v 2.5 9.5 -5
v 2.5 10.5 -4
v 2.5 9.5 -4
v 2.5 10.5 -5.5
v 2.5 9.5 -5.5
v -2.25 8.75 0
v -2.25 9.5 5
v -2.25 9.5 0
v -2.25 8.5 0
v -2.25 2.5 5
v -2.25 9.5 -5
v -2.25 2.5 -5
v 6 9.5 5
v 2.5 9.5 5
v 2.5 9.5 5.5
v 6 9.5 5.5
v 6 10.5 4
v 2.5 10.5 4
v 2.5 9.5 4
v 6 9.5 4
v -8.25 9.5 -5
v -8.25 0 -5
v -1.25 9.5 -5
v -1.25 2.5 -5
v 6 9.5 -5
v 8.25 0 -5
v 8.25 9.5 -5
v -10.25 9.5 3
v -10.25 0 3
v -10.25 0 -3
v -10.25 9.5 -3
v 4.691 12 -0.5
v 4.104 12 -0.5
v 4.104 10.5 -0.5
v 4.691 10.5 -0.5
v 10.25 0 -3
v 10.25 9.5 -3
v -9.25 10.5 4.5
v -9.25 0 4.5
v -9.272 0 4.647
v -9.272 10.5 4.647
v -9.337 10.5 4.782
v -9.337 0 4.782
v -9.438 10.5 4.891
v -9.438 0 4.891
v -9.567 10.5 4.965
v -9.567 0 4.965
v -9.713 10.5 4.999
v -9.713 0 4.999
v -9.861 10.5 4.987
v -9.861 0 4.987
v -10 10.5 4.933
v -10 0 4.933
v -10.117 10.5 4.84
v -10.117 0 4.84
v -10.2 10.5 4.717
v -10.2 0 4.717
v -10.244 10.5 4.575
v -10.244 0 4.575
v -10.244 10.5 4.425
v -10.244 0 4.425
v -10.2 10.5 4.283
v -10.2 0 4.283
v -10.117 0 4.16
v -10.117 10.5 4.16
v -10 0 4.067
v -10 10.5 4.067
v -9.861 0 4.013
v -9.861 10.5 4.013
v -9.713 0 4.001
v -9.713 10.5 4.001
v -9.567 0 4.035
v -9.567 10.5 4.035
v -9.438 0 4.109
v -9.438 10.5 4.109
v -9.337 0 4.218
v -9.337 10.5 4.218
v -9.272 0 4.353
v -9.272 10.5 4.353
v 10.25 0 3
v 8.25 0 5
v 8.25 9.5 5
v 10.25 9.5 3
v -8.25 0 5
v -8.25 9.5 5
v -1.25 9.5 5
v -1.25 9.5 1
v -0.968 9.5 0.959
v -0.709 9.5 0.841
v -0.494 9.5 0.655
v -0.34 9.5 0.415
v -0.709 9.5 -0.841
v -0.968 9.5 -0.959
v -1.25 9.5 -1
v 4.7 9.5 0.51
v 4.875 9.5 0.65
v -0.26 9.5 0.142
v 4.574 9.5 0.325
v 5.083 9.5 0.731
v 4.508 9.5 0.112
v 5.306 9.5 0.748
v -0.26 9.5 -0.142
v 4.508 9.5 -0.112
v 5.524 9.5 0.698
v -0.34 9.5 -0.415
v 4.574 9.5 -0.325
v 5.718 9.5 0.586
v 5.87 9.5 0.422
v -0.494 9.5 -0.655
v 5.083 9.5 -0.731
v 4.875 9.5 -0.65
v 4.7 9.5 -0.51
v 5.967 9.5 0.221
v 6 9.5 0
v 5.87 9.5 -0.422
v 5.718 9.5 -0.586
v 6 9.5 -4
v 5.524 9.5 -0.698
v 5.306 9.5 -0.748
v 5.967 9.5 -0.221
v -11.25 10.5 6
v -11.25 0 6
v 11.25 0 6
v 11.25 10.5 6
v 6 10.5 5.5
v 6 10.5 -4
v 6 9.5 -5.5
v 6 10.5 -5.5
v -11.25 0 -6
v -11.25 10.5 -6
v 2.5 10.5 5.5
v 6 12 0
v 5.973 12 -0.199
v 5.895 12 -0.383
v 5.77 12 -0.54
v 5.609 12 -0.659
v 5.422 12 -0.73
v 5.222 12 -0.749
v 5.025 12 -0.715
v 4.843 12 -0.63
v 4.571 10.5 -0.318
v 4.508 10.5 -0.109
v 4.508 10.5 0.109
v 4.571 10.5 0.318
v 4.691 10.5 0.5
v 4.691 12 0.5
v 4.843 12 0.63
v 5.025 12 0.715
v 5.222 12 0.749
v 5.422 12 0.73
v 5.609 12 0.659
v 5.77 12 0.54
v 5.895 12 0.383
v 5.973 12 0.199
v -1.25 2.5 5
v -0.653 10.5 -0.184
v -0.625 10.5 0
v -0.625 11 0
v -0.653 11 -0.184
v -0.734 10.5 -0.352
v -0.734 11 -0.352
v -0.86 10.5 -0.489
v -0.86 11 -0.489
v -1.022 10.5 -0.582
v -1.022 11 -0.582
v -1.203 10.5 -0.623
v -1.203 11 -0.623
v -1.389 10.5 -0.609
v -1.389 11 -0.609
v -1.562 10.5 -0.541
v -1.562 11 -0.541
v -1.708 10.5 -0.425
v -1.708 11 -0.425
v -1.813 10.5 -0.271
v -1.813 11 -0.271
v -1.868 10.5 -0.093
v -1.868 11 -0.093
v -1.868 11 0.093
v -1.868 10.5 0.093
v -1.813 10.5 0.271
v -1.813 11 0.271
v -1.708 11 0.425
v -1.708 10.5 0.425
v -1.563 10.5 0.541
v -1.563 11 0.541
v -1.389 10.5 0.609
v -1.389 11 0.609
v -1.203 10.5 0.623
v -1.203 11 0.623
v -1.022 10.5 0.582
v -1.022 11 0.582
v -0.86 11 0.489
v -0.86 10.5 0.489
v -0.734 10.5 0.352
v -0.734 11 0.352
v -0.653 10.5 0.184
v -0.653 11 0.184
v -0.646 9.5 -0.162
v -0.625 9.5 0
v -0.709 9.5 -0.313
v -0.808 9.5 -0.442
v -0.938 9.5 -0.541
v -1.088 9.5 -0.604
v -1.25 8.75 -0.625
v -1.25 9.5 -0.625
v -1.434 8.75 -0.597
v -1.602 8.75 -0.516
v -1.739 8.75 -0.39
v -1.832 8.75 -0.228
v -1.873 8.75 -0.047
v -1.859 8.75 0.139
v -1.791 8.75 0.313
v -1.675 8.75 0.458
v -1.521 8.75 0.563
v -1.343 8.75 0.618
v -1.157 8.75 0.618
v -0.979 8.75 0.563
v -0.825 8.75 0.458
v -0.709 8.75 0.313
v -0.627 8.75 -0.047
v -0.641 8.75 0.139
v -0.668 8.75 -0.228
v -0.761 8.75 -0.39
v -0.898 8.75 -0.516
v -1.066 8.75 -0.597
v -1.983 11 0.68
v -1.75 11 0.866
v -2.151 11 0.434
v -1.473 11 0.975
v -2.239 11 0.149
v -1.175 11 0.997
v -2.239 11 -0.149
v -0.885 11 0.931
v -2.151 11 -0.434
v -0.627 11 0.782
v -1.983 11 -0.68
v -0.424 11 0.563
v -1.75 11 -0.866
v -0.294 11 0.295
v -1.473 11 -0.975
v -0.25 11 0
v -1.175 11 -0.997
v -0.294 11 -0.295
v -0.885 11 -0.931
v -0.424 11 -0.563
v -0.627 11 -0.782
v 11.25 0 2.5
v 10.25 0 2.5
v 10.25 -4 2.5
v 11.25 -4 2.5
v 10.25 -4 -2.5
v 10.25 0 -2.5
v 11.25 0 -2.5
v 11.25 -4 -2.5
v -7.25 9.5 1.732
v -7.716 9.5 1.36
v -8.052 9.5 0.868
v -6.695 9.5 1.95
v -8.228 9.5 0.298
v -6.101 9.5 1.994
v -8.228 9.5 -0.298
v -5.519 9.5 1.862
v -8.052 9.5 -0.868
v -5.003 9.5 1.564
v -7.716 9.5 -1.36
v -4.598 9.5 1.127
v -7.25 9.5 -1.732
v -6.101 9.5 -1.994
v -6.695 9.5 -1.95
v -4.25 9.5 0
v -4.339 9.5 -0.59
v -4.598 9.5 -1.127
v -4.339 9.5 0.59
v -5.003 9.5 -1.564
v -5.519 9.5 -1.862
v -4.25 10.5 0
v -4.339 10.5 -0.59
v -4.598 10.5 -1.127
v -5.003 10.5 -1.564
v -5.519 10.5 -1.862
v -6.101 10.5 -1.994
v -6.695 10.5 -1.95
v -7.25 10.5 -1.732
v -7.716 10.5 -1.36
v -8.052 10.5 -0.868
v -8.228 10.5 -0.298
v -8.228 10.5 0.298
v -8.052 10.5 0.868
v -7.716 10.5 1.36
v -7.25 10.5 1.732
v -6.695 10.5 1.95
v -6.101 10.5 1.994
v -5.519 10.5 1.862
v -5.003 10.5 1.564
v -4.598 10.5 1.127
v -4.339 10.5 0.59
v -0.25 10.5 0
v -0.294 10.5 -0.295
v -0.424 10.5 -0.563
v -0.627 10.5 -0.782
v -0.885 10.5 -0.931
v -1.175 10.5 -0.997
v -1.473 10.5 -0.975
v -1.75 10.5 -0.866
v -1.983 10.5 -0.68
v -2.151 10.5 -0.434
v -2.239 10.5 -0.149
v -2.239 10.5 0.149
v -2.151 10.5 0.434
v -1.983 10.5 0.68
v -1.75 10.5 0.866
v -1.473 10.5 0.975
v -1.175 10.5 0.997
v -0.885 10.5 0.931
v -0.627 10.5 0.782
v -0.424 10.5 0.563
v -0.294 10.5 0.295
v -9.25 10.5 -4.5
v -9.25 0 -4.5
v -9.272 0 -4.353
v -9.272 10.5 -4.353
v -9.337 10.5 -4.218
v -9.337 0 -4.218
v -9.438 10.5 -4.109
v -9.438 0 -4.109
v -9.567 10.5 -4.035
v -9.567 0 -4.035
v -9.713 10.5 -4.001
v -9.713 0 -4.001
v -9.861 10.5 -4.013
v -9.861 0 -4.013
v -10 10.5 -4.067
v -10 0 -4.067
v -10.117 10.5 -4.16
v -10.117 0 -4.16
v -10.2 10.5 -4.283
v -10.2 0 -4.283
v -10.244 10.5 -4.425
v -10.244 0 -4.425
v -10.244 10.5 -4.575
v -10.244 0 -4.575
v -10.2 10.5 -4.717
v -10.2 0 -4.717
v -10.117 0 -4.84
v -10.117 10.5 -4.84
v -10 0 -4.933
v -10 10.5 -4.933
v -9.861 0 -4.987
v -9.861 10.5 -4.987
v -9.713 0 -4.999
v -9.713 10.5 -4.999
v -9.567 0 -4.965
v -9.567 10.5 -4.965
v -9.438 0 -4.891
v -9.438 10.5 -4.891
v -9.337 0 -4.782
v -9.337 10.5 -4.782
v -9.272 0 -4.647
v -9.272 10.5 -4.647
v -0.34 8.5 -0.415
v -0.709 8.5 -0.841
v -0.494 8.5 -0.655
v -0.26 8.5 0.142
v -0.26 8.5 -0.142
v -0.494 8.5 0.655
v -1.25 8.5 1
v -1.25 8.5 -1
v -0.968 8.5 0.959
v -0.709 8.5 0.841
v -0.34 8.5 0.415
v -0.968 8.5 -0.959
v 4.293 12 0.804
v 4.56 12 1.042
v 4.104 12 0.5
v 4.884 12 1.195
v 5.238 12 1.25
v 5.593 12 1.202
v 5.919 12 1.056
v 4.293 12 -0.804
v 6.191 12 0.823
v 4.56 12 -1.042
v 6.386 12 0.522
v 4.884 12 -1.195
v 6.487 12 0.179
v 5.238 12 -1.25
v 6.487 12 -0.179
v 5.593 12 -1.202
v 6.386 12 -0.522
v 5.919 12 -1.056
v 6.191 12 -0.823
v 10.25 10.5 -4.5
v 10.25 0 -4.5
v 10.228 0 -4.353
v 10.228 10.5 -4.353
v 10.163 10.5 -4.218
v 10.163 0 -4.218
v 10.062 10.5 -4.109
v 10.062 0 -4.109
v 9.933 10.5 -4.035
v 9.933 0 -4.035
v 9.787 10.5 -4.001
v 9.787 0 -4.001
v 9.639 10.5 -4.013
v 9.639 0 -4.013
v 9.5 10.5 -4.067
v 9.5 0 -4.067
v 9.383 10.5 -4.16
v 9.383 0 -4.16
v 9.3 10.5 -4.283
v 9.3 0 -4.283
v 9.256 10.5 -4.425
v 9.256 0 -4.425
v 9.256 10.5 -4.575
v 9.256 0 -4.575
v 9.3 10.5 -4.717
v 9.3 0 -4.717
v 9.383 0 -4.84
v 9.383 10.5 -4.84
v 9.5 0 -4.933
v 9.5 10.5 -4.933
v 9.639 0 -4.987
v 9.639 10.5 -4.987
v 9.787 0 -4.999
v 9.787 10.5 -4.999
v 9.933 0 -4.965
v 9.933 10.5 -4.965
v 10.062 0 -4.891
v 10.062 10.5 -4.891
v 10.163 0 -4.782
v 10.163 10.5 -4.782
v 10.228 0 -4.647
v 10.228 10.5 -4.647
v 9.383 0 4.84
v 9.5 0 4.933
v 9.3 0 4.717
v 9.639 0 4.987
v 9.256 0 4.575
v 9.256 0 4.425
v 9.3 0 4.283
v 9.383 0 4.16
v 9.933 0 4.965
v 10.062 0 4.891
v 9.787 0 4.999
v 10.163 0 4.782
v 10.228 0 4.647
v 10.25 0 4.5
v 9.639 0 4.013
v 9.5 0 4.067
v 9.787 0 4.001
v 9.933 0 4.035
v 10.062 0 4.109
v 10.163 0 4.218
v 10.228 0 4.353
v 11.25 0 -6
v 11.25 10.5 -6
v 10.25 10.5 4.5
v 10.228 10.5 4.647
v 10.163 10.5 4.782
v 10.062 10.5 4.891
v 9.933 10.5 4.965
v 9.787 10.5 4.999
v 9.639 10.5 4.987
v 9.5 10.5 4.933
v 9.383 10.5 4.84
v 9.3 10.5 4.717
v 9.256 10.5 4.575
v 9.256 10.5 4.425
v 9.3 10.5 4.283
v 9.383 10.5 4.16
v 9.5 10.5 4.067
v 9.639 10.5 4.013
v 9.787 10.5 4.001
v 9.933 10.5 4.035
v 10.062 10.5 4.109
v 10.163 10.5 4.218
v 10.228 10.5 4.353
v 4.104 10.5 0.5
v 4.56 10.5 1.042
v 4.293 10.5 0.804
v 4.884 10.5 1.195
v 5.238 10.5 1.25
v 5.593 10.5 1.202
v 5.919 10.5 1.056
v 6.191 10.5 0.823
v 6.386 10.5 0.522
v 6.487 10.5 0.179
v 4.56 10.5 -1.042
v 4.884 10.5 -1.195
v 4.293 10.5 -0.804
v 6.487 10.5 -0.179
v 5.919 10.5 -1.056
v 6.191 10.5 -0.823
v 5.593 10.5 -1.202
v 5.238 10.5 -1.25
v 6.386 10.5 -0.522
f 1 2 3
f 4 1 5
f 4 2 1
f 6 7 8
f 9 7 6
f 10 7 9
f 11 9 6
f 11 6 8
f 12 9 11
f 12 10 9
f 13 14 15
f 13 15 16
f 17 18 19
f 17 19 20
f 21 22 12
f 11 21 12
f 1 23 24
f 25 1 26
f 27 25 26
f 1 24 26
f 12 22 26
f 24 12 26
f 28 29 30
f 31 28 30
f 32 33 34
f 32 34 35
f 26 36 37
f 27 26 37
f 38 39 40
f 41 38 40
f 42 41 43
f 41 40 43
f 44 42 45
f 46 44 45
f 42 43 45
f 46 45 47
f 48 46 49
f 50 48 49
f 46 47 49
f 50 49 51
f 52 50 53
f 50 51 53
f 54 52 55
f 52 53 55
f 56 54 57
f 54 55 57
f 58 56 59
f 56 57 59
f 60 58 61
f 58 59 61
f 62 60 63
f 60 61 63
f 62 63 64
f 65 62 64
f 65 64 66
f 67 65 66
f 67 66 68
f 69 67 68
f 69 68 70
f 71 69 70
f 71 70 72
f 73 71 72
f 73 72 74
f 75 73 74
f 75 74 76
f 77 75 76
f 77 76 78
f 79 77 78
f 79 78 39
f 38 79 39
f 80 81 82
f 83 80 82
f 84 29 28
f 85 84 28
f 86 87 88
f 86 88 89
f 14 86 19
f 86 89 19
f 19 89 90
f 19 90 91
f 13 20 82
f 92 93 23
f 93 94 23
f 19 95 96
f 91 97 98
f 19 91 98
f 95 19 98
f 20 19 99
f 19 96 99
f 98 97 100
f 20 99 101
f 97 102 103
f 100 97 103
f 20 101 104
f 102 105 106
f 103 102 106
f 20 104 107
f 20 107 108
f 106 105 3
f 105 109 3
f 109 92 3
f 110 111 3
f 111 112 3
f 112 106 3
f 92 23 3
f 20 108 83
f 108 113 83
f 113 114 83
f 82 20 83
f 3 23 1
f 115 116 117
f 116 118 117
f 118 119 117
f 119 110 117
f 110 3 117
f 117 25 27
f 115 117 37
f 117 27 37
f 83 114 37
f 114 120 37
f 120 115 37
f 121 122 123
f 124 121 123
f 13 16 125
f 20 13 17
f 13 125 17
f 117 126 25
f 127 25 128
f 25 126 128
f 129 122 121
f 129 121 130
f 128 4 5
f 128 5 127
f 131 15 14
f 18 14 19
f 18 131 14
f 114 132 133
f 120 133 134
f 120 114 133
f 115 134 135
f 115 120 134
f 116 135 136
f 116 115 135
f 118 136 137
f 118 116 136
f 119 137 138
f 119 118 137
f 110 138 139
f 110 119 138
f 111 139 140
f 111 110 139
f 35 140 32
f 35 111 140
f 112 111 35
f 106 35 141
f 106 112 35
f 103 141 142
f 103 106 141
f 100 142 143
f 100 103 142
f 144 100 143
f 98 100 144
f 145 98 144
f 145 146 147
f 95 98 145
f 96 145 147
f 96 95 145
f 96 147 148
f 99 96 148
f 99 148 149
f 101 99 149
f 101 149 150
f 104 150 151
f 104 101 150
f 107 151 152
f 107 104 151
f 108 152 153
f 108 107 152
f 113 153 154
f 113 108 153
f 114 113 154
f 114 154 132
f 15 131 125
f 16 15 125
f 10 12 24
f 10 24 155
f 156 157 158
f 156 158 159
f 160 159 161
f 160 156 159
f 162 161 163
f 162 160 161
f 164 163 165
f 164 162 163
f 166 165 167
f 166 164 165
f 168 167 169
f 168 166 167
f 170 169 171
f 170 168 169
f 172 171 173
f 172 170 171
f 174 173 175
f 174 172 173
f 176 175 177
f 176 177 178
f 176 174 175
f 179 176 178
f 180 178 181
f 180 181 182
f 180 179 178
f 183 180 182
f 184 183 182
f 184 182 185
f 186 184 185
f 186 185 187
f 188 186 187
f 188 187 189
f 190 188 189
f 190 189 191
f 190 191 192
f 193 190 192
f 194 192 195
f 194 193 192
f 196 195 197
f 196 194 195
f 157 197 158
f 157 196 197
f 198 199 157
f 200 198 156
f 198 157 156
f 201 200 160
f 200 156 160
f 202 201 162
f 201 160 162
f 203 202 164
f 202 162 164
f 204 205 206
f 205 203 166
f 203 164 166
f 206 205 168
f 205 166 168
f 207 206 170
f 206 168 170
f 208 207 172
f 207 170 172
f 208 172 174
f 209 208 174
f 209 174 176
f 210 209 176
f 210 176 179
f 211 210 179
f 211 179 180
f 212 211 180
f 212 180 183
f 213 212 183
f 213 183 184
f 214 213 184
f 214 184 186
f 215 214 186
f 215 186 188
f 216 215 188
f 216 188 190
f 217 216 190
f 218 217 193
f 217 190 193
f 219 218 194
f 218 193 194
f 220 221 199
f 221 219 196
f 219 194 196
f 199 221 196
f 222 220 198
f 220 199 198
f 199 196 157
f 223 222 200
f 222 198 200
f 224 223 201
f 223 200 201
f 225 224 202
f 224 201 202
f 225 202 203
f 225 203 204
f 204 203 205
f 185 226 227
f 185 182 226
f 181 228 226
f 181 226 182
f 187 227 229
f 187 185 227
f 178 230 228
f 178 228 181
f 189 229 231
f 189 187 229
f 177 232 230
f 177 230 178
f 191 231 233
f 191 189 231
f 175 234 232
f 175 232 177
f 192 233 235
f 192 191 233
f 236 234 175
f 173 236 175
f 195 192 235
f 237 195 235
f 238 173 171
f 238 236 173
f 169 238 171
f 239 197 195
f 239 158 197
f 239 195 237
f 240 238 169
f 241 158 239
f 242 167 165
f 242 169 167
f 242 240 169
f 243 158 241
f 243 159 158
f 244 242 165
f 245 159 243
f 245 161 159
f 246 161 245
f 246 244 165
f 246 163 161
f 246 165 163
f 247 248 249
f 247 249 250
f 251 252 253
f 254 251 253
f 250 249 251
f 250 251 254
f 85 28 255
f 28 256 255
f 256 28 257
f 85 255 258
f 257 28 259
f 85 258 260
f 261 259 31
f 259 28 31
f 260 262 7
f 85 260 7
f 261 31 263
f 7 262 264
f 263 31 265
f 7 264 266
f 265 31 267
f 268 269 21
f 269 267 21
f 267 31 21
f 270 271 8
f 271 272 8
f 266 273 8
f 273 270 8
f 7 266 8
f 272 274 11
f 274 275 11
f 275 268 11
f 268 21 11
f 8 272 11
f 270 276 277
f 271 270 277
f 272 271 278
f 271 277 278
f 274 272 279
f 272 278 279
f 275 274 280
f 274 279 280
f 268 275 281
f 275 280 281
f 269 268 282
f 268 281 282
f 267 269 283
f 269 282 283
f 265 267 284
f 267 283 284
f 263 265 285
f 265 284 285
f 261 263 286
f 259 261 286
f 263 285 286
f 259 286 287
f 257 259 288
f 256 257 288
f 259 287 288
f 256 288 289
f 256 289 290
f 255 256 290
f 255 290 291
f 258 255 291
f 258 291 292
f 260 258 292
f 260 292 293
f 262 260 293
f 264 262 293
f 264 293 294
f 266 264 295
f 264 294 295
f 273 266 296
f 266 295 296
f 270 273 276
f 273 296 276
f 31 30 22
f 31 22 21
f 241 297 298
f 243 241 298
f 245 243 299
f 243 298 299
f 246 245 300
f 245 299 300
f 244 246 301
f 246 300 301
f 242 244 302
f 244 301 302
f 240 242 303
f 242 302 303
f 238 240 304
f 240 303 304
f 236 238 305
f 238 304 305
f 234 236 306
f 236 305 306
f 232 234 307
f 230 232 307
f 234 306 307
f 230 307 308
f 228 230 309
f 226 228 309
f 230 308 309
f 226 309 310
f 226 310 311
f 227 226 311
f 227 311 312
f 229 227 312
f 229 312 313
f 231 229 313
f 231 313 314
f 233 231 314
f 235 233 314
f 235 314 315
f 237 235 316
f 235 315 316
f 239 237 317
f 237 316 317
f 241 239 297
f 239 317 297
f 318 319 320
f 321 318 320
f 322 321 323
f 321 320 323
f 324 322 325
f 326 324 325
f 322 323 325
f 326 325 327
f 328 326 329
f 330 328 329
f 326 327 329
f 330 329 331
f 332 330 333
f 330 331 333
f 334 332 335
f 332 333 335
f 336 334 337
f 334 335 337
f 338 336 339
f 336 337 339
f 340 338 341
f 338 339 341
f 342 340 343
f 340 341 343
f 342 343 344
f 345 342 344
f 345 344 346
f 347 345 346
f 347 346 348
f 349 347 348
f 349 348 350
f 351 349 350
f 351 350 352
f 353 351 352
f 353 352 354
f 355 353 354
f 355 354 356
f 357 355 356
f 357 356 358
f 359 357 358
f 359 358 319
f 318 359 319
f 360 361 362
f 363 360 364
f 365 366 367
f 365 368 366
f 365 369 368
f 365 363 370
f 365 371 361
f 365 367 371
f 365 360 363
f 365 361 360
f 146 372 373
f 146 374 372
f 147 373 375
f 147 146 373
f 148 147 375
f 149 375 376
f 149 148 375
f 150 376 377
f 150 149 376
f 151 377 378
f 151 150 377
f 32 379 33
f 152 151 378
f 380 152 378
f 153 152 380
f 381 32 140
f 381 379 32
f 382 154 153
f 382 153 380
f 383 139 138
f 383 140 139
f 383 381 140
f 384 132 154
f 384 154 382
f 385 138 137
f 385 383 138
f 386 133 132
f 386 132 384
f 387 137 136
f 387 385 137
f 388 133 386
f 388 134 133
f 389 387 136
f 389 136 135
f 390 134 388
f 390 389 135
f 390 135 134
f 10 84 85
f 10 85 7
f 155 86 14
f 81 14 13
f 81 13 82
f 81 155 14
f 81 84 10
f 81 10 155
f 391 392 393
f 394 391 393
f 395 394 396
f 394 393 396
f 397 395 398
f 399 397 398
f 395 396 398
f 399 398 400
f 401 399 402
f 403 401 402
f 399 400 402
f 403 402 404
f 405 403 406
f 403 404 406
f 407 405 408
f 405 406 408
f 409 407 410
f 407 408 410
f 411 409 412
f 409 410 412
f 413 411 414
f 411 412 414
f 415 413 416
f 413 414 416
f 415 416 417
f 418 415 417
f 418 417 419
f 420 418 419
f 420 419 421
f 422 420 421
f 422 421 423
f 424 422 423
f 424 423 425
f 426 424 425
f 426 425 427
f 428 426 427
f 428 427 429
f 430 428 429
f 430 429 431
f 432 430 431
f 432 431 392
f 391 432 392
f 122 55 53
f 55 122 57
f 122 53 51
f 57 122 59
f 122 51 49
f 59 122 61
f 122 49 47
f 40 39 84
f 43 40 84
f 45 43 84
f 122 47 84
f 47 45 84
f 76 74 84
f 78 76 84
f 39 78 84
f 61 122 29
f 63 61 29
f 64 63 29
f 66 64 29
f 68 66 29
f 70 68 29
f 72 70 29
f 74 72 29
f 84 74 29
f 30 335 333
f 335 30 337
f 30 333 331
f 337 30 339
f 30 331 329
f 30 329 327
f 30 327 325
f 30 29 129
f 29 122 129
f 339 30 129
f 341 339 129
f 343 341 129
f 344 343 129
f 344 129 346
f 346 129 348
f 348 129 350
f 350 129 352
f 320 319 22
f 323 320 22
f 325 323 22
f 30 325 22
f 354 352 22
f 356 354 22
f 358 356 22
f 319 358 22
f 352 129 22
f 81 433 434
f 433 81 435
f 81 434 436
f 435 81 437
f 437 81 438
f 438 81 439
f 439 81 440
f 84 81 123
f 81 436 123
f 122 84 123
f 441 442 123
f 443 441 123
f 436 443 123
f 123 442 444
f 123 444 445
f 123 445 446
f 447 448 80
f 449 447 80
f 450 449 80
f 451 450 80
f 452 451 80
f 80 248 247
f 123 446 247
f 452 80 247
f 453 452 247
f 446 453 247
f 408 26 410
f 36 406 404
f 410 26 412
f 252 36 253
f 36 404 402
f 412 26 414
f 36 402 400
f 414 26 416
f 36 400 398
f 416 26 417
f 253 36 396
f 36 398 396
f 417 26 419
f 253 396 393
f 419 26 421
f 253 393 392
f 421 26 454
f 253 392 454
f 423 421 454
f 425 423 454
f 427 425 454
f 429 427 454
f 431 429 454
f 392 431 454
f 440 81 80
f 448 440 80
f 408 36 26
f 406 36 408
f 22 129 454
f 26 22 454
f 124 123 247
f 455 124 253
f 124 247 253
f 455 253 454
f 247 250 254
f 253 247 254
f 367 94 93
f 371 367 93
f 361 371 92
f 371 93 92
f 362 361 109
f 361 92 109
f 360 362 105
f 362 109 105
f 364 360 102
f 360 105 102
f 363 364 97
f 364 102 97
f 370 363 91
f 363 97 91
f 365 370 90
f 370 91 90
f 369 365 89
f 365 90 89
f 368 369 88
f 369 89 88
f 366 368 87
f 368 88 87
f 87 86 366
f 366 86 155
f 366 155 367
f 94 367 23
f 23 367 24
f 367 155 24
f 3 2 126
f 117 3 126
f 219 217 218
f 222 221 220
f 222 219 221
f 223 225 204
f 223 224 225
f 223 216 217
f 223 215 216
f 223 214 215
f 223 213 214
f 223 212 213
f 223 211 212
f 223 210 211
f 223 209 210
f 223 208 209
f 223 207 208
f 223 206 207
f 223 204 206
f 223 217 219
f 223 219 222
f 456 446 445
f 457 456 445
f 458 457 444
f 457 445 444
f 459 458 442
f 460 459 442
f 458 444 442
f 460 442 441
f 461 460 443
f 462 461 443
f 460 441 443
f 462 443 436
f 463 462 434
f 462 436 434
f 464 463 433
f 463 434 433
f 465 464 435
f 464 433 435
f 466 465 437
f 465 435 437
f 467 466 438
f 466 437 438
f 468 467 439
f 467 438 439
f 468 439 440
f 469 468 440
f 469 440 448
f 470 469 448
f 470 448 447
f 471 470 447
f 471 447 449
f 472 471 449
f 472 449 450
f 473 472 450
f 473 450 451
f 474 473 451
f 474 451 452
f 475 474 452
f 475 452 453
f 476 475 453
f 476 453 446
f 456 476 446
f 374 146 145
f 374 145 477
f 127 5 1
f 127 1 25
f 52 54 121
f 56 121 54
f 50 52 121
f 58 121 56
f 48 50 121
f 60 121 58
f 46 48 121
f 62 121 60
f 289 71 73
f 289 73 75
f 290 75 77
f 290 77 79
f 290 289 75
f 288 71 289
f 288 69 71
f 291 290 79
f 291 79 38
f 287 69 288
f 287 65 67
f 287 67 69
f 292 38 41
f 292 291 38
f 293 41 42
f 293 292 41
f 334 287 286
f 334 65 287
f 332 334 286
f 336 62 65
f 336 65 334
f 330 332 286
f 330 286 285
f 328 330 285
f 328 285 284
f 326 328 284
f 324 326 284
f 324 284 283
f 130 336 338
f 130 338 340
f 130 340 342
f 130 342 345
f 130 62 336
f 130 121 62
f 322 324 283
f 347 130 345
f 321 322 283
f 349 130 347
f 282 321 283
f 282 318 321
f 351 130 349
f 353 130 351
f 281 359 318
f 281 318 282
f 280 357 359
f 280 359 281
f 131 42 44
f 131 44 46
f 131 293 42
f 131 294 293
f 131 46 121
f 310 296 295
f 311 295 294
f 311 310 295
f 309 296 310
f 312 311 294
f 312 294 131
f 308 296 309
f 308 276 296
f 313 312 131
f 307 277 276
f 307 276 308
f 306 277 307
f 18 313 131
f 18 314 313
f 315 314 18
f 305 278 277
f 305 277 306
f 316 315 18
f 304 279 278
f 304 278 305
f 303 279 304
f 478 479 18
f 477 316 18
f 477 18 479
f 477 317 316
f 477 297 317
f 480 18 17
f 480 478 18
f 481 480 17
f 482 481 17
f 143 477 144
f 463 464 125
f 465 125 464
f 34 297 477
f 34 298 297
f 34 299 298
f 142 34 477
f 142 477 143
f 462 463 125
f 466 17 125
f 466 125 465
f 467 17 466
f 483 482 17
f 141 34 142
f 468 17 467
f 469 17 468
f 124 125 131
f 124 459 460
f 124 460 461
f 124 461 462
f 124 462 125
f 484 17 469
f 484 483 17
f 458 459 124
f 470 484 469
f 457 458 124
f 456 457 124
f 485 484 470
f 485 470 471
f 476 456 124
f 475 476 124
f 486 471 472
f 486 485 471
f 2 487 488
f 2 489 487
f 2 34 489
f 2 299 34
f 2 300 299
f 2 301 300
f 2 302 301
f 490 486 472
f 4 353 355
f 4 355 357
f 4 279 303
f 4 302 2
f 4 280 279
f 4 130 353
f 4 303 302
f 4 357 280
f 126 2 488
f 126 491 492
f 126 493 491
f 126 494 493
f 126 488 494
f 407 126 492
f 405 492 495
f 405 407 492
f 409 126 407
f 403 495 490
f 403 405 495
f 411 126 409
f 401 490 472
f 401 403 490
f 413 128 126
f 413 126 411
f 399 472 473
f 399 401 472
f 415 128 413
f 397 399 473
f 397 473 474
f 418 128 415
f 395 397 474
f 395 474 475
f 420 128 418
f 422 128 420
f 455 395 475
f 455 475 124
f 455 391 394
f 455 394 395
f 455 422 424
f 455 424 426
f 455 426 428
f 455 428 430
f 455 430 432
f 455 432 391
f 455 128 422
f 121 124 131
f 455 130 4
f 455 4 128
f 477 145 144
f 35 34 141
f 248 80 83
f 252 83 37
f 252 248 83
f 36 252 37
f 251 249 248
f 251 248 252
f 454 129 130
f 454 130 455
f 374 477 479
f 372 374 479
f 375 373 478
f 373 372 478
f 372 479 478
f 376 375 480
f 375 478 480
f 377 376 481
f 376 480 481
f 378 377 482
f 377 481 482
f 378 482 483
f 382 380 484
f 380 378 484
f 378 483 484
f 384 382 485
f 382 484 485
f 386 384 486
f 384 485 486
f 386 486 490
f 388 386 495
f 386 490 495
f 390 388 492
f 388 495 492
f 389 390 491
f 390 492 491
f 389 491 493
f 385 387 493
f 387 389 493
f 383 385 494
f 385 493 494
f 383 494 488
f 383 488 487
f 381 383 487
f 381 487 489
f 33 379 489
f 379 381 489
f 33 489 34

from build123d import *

# Parameters (mm, degrees)
SKETCH1_W           = 22.5
SKETCH1_H           = 12
SKETCH1_W_2         = 11.5
SKETCH1_H_2         = 10
SKETCH1_W_3         = 8
BOSS_EXTRUDE1_DEPTH = 10.5
SKETCH2_W           = 22.5
SKETCH2_H           = 12
SKETCH2_R           = 2
SKETCH2_R_2         = 0.75
SKETCH2_W_2         = 3.5
SKETCH2_H_2         = 1.5
BOSS_EXTRUDE2_DEPTH = 1
SKETCH3_W           = 3.5
SKETCH3_H           = 1.5
CUT_EXTRUDE1_DEPTH  = 1
SKETCH4_W           = 10
SKETCH4_H           = 2.5
CUT_EXTRUDE2_DEPTH  = 1
CHAMFER1_SIZE       = 2
SKETCH5_R           = 0.5
CUT_EXTRUDE3_DEPTH  = 11.5
SKETCH6_W           = 1
SKETCH6_H           = 5
BOSS_EXTRUDE3_DEPTH = 4
SKETCH7_R           = 1
SKETCH7_R_2         = 0.625
BOSS_EXTRUDE4_DEPTH = 1.75
SKETCH8_R           = 0.625
CUT_EXTRUDE4_DEPTH  = 1.75
SKETCH9_R           = 1
BOSS_EXTRUDE5_DEPTH = 0.25
SKETCH10_R          = 1
SKETCH10_R_2        = 0.625
BOSS_EXTRUDE6_DEPTH = 0.5
SKETCH11_R          = 1.25
SKETCH11_R_2        = 0.75
BOSS_EXTRUDE7_DEPTH = 1.5
CUT_EXTRUDE5_DEPTH  = 1.5


with BuildPart() as part:
    # Sketch1 → Boss-Extrude1 (new body)
    with BuildSketch(Plane(origin=(0, 0, 0), x_dir=(1, 0, 0), z_dir=(0, 1, 0))):
        Rectangle(SKETCH1_W, SKETCH1_H)
        with Locations((4.5, 0)):
            Rectangle(SKETCH1_W_2, SKETCH1_H_2, mode=Mode.SUBTRACT)
        with Locations((-6.25, 0)):
            Rectangle(SKETCH1_W_3, SKETCH1_H_2, mode=Mode.SUBTRACT)
    extrude(amount=BOSS_EXTRUDE1_DEPTH)

    # Sketch2 → Boss-Extrude2 (add)
    with BuildSketch(Plane(origin=(0, 10.5, 0), x_dir=(1, 0, 0), z_dir=(0, 1, 0))):
        Rectangle(SKETCH2_W, SKETCH2_H)
        with Locations((-6.25, 0)):
            Circle(SKETCH2_R, mode=Mode.SUBTRACT)
        with Locations((5.25, 0)):
            Circle(SKETCH2_R_2, mode=Mode.SUBTRACT)
        with Locations((4.25, 4.75)):
            Rectangle(SKETCH2_W_2, SKETCH2_H_2, mode=Mode.SUBTRACT)
        with Locations((4.25, -4.75)):
            Rectangle(SKETCH2_W_2, SKETCH2_H_2, mode=Mode.SUBTRACT)
    extrude(amount=-BOSS_EXTRUDE2_DEPTH)

    # Sketch3 → Cut-Extrude1 (cut)
    with BuildSketch(Plane(origin=(0, 10.5, 0), x_dir=(1, 0, 0), z_dir=(0, 1, 0))):
        with Locations((4.25, 4.75)):
            Rectangle(SKETCH3_W, SKETCH3_H)
        with Locations((4.25, -4.75)):
            Rectangle(SKETCH3_W, SKETCH3_H)
    extrude(amount=-CUT_EXTRUDE1_DEPTH, mode=Mode.SUBTRACT)

    # Sketch4 → Cut-Extrude2 (cut)
    with BuildSketch(Plane.ZY.offset(2.25)):
        with Locations((0, 1.25)):
            Rectangle(SKETCH4_W, SKETCH4_H)
    extrude(amount=-CUT_EXTRUDE2_DEPTH, mode=Mode.SUBTRACT)

    # Chamfer1
    chamfer1_edges = [part.edges().sort_by_distance(p)[0] for p in [
        (-10.25, 4.75, 5),
        (-10.25, 4.75, -5),
        (10.25, 4.75, -5),
        (10.25, 4.75, 5),
    ]]
    chamfer(chamfer1_edges, length=CHAMFER1_SIZE)

    # Sketch5 → Cut-Extrude3 (cut, through all)
    with BuildSketch(Plane.XZ):
        with Locations((-9.75, 4.5)):
            Circle(SKETCH5_R)
        with Locations((9.75, 4.5)):
            Circle(SKETCH5_R)
        with Locations((9.75, -4.5)):
            Circle(SKETCH5_R)
        with Locations((-9.75, -4.5)):
            Circle(SKETCH5_R)
    extrude(amount=-CUT_EXTRUDE3_DEPTH, mode=Mode.SUBTRACT)

    # Sketch6 → Boss-Extrude3 (add)
    with BuildSketch(Plane.XZ):
        with Locations((10.75, 0)):
            Rectangle(SKETCH6_W, SKETCH6_H)
    extrude(amount=BOSS_EXTRUDE3_DEPTH)

    # Sketch7 → Boss-Extrude4 (add)
    with BuildSketch(Plane(origin=(0, 10.5, 0), x_dir=(1, 0, 0), z_dir=(0, 1, 0))):
        with Locations((-1.25, 0)):
            Circle(SKETCH7_R)
        with Locations((-1.25, 0)):
            Circle(SKETCH7_R_2, mode=Mode.SUBTRACT)
    extrude(amount=-BOSS_EXTRUDE4_DEPTH)

    # Sketch8 → Cut-Extrude4 (cut)
    with BuildSketch(Plane(origin=(0, 10.5, 0), x_dir=(1, 0, 0), z_dir=(0, 1, 0))):
        with Locations((-1.25, 0)):
            Circle(SKETCH8_R)
    extrude(amount=-CUT_EXTRUDE4_DEPTH, mode=Mode.SUBTRACT)

    # Sketch9 → Boss-Extrude5 (add)
    with BuildSketch(Plane.XZ.offset(-8.75)):
        with Locations((-1.25, 0)):
            Circle(SKETCH9_R)
    extrude(amount=BOSS_EXTRUDE5_DEPTH)

    # Sketch10 → Boss-Extrude6 (add)
    with BuildSketch(Plane(origin=(0, 10.5, 0), x_dir=(1, 0, 0), z_dir=(0, 1, 0))):
        with Locations((-1.25, 0)):
            Circle(SKETCH10_R)
        with Locations((-1.25, 0)):
            Circle(SKETCH10_R_2, mode=Mode.SUBTRACT)
    extrude(amount=BOSS_EXTRUDE6_DEPTH)

    # Sketch11 → Boss-Extrude7 (add)
    with BuildSketch(Plane(origin=(0, 10.5, 0), x_dir=(1, 0, 0), z_dir=(0, 1, 0))):
        with Locations((5.25, 0)):
            Circle(SKETCH11_R)
        with Locations((5.25, 0)):
            Circle(SKETCH11_R_2, mode=Mode.SUBTRACT)
    extrude(amount=BOSS_EXTRUDE7_DEPTH)

    # Sketch12 → Cut-Extrude5 (cut)
    with BuildSketch(Plane(origin=(0, 12, 0), x_dir=(1, 0, 0), z_dir=(0, 1, 0))):
        with BuildLine():
            Line((4.104356076, 0.5), (4.690983006, 0.5))
            ThreePointArc((4.690983006, 0.5), (4.5, 0), (4.690983006, -0.5))
            Line((4.690983006, -0.5), (4.104356076, -0.5))
            ThreePointArc((4.104356076, -0.5), (4, 0), (4.104356076, 0.5))
        make_face()
    extrude(amount=-CUT_EXTRUDE5_DEPTH, mode=Mode.SUBTRACT)


solid = part.part
